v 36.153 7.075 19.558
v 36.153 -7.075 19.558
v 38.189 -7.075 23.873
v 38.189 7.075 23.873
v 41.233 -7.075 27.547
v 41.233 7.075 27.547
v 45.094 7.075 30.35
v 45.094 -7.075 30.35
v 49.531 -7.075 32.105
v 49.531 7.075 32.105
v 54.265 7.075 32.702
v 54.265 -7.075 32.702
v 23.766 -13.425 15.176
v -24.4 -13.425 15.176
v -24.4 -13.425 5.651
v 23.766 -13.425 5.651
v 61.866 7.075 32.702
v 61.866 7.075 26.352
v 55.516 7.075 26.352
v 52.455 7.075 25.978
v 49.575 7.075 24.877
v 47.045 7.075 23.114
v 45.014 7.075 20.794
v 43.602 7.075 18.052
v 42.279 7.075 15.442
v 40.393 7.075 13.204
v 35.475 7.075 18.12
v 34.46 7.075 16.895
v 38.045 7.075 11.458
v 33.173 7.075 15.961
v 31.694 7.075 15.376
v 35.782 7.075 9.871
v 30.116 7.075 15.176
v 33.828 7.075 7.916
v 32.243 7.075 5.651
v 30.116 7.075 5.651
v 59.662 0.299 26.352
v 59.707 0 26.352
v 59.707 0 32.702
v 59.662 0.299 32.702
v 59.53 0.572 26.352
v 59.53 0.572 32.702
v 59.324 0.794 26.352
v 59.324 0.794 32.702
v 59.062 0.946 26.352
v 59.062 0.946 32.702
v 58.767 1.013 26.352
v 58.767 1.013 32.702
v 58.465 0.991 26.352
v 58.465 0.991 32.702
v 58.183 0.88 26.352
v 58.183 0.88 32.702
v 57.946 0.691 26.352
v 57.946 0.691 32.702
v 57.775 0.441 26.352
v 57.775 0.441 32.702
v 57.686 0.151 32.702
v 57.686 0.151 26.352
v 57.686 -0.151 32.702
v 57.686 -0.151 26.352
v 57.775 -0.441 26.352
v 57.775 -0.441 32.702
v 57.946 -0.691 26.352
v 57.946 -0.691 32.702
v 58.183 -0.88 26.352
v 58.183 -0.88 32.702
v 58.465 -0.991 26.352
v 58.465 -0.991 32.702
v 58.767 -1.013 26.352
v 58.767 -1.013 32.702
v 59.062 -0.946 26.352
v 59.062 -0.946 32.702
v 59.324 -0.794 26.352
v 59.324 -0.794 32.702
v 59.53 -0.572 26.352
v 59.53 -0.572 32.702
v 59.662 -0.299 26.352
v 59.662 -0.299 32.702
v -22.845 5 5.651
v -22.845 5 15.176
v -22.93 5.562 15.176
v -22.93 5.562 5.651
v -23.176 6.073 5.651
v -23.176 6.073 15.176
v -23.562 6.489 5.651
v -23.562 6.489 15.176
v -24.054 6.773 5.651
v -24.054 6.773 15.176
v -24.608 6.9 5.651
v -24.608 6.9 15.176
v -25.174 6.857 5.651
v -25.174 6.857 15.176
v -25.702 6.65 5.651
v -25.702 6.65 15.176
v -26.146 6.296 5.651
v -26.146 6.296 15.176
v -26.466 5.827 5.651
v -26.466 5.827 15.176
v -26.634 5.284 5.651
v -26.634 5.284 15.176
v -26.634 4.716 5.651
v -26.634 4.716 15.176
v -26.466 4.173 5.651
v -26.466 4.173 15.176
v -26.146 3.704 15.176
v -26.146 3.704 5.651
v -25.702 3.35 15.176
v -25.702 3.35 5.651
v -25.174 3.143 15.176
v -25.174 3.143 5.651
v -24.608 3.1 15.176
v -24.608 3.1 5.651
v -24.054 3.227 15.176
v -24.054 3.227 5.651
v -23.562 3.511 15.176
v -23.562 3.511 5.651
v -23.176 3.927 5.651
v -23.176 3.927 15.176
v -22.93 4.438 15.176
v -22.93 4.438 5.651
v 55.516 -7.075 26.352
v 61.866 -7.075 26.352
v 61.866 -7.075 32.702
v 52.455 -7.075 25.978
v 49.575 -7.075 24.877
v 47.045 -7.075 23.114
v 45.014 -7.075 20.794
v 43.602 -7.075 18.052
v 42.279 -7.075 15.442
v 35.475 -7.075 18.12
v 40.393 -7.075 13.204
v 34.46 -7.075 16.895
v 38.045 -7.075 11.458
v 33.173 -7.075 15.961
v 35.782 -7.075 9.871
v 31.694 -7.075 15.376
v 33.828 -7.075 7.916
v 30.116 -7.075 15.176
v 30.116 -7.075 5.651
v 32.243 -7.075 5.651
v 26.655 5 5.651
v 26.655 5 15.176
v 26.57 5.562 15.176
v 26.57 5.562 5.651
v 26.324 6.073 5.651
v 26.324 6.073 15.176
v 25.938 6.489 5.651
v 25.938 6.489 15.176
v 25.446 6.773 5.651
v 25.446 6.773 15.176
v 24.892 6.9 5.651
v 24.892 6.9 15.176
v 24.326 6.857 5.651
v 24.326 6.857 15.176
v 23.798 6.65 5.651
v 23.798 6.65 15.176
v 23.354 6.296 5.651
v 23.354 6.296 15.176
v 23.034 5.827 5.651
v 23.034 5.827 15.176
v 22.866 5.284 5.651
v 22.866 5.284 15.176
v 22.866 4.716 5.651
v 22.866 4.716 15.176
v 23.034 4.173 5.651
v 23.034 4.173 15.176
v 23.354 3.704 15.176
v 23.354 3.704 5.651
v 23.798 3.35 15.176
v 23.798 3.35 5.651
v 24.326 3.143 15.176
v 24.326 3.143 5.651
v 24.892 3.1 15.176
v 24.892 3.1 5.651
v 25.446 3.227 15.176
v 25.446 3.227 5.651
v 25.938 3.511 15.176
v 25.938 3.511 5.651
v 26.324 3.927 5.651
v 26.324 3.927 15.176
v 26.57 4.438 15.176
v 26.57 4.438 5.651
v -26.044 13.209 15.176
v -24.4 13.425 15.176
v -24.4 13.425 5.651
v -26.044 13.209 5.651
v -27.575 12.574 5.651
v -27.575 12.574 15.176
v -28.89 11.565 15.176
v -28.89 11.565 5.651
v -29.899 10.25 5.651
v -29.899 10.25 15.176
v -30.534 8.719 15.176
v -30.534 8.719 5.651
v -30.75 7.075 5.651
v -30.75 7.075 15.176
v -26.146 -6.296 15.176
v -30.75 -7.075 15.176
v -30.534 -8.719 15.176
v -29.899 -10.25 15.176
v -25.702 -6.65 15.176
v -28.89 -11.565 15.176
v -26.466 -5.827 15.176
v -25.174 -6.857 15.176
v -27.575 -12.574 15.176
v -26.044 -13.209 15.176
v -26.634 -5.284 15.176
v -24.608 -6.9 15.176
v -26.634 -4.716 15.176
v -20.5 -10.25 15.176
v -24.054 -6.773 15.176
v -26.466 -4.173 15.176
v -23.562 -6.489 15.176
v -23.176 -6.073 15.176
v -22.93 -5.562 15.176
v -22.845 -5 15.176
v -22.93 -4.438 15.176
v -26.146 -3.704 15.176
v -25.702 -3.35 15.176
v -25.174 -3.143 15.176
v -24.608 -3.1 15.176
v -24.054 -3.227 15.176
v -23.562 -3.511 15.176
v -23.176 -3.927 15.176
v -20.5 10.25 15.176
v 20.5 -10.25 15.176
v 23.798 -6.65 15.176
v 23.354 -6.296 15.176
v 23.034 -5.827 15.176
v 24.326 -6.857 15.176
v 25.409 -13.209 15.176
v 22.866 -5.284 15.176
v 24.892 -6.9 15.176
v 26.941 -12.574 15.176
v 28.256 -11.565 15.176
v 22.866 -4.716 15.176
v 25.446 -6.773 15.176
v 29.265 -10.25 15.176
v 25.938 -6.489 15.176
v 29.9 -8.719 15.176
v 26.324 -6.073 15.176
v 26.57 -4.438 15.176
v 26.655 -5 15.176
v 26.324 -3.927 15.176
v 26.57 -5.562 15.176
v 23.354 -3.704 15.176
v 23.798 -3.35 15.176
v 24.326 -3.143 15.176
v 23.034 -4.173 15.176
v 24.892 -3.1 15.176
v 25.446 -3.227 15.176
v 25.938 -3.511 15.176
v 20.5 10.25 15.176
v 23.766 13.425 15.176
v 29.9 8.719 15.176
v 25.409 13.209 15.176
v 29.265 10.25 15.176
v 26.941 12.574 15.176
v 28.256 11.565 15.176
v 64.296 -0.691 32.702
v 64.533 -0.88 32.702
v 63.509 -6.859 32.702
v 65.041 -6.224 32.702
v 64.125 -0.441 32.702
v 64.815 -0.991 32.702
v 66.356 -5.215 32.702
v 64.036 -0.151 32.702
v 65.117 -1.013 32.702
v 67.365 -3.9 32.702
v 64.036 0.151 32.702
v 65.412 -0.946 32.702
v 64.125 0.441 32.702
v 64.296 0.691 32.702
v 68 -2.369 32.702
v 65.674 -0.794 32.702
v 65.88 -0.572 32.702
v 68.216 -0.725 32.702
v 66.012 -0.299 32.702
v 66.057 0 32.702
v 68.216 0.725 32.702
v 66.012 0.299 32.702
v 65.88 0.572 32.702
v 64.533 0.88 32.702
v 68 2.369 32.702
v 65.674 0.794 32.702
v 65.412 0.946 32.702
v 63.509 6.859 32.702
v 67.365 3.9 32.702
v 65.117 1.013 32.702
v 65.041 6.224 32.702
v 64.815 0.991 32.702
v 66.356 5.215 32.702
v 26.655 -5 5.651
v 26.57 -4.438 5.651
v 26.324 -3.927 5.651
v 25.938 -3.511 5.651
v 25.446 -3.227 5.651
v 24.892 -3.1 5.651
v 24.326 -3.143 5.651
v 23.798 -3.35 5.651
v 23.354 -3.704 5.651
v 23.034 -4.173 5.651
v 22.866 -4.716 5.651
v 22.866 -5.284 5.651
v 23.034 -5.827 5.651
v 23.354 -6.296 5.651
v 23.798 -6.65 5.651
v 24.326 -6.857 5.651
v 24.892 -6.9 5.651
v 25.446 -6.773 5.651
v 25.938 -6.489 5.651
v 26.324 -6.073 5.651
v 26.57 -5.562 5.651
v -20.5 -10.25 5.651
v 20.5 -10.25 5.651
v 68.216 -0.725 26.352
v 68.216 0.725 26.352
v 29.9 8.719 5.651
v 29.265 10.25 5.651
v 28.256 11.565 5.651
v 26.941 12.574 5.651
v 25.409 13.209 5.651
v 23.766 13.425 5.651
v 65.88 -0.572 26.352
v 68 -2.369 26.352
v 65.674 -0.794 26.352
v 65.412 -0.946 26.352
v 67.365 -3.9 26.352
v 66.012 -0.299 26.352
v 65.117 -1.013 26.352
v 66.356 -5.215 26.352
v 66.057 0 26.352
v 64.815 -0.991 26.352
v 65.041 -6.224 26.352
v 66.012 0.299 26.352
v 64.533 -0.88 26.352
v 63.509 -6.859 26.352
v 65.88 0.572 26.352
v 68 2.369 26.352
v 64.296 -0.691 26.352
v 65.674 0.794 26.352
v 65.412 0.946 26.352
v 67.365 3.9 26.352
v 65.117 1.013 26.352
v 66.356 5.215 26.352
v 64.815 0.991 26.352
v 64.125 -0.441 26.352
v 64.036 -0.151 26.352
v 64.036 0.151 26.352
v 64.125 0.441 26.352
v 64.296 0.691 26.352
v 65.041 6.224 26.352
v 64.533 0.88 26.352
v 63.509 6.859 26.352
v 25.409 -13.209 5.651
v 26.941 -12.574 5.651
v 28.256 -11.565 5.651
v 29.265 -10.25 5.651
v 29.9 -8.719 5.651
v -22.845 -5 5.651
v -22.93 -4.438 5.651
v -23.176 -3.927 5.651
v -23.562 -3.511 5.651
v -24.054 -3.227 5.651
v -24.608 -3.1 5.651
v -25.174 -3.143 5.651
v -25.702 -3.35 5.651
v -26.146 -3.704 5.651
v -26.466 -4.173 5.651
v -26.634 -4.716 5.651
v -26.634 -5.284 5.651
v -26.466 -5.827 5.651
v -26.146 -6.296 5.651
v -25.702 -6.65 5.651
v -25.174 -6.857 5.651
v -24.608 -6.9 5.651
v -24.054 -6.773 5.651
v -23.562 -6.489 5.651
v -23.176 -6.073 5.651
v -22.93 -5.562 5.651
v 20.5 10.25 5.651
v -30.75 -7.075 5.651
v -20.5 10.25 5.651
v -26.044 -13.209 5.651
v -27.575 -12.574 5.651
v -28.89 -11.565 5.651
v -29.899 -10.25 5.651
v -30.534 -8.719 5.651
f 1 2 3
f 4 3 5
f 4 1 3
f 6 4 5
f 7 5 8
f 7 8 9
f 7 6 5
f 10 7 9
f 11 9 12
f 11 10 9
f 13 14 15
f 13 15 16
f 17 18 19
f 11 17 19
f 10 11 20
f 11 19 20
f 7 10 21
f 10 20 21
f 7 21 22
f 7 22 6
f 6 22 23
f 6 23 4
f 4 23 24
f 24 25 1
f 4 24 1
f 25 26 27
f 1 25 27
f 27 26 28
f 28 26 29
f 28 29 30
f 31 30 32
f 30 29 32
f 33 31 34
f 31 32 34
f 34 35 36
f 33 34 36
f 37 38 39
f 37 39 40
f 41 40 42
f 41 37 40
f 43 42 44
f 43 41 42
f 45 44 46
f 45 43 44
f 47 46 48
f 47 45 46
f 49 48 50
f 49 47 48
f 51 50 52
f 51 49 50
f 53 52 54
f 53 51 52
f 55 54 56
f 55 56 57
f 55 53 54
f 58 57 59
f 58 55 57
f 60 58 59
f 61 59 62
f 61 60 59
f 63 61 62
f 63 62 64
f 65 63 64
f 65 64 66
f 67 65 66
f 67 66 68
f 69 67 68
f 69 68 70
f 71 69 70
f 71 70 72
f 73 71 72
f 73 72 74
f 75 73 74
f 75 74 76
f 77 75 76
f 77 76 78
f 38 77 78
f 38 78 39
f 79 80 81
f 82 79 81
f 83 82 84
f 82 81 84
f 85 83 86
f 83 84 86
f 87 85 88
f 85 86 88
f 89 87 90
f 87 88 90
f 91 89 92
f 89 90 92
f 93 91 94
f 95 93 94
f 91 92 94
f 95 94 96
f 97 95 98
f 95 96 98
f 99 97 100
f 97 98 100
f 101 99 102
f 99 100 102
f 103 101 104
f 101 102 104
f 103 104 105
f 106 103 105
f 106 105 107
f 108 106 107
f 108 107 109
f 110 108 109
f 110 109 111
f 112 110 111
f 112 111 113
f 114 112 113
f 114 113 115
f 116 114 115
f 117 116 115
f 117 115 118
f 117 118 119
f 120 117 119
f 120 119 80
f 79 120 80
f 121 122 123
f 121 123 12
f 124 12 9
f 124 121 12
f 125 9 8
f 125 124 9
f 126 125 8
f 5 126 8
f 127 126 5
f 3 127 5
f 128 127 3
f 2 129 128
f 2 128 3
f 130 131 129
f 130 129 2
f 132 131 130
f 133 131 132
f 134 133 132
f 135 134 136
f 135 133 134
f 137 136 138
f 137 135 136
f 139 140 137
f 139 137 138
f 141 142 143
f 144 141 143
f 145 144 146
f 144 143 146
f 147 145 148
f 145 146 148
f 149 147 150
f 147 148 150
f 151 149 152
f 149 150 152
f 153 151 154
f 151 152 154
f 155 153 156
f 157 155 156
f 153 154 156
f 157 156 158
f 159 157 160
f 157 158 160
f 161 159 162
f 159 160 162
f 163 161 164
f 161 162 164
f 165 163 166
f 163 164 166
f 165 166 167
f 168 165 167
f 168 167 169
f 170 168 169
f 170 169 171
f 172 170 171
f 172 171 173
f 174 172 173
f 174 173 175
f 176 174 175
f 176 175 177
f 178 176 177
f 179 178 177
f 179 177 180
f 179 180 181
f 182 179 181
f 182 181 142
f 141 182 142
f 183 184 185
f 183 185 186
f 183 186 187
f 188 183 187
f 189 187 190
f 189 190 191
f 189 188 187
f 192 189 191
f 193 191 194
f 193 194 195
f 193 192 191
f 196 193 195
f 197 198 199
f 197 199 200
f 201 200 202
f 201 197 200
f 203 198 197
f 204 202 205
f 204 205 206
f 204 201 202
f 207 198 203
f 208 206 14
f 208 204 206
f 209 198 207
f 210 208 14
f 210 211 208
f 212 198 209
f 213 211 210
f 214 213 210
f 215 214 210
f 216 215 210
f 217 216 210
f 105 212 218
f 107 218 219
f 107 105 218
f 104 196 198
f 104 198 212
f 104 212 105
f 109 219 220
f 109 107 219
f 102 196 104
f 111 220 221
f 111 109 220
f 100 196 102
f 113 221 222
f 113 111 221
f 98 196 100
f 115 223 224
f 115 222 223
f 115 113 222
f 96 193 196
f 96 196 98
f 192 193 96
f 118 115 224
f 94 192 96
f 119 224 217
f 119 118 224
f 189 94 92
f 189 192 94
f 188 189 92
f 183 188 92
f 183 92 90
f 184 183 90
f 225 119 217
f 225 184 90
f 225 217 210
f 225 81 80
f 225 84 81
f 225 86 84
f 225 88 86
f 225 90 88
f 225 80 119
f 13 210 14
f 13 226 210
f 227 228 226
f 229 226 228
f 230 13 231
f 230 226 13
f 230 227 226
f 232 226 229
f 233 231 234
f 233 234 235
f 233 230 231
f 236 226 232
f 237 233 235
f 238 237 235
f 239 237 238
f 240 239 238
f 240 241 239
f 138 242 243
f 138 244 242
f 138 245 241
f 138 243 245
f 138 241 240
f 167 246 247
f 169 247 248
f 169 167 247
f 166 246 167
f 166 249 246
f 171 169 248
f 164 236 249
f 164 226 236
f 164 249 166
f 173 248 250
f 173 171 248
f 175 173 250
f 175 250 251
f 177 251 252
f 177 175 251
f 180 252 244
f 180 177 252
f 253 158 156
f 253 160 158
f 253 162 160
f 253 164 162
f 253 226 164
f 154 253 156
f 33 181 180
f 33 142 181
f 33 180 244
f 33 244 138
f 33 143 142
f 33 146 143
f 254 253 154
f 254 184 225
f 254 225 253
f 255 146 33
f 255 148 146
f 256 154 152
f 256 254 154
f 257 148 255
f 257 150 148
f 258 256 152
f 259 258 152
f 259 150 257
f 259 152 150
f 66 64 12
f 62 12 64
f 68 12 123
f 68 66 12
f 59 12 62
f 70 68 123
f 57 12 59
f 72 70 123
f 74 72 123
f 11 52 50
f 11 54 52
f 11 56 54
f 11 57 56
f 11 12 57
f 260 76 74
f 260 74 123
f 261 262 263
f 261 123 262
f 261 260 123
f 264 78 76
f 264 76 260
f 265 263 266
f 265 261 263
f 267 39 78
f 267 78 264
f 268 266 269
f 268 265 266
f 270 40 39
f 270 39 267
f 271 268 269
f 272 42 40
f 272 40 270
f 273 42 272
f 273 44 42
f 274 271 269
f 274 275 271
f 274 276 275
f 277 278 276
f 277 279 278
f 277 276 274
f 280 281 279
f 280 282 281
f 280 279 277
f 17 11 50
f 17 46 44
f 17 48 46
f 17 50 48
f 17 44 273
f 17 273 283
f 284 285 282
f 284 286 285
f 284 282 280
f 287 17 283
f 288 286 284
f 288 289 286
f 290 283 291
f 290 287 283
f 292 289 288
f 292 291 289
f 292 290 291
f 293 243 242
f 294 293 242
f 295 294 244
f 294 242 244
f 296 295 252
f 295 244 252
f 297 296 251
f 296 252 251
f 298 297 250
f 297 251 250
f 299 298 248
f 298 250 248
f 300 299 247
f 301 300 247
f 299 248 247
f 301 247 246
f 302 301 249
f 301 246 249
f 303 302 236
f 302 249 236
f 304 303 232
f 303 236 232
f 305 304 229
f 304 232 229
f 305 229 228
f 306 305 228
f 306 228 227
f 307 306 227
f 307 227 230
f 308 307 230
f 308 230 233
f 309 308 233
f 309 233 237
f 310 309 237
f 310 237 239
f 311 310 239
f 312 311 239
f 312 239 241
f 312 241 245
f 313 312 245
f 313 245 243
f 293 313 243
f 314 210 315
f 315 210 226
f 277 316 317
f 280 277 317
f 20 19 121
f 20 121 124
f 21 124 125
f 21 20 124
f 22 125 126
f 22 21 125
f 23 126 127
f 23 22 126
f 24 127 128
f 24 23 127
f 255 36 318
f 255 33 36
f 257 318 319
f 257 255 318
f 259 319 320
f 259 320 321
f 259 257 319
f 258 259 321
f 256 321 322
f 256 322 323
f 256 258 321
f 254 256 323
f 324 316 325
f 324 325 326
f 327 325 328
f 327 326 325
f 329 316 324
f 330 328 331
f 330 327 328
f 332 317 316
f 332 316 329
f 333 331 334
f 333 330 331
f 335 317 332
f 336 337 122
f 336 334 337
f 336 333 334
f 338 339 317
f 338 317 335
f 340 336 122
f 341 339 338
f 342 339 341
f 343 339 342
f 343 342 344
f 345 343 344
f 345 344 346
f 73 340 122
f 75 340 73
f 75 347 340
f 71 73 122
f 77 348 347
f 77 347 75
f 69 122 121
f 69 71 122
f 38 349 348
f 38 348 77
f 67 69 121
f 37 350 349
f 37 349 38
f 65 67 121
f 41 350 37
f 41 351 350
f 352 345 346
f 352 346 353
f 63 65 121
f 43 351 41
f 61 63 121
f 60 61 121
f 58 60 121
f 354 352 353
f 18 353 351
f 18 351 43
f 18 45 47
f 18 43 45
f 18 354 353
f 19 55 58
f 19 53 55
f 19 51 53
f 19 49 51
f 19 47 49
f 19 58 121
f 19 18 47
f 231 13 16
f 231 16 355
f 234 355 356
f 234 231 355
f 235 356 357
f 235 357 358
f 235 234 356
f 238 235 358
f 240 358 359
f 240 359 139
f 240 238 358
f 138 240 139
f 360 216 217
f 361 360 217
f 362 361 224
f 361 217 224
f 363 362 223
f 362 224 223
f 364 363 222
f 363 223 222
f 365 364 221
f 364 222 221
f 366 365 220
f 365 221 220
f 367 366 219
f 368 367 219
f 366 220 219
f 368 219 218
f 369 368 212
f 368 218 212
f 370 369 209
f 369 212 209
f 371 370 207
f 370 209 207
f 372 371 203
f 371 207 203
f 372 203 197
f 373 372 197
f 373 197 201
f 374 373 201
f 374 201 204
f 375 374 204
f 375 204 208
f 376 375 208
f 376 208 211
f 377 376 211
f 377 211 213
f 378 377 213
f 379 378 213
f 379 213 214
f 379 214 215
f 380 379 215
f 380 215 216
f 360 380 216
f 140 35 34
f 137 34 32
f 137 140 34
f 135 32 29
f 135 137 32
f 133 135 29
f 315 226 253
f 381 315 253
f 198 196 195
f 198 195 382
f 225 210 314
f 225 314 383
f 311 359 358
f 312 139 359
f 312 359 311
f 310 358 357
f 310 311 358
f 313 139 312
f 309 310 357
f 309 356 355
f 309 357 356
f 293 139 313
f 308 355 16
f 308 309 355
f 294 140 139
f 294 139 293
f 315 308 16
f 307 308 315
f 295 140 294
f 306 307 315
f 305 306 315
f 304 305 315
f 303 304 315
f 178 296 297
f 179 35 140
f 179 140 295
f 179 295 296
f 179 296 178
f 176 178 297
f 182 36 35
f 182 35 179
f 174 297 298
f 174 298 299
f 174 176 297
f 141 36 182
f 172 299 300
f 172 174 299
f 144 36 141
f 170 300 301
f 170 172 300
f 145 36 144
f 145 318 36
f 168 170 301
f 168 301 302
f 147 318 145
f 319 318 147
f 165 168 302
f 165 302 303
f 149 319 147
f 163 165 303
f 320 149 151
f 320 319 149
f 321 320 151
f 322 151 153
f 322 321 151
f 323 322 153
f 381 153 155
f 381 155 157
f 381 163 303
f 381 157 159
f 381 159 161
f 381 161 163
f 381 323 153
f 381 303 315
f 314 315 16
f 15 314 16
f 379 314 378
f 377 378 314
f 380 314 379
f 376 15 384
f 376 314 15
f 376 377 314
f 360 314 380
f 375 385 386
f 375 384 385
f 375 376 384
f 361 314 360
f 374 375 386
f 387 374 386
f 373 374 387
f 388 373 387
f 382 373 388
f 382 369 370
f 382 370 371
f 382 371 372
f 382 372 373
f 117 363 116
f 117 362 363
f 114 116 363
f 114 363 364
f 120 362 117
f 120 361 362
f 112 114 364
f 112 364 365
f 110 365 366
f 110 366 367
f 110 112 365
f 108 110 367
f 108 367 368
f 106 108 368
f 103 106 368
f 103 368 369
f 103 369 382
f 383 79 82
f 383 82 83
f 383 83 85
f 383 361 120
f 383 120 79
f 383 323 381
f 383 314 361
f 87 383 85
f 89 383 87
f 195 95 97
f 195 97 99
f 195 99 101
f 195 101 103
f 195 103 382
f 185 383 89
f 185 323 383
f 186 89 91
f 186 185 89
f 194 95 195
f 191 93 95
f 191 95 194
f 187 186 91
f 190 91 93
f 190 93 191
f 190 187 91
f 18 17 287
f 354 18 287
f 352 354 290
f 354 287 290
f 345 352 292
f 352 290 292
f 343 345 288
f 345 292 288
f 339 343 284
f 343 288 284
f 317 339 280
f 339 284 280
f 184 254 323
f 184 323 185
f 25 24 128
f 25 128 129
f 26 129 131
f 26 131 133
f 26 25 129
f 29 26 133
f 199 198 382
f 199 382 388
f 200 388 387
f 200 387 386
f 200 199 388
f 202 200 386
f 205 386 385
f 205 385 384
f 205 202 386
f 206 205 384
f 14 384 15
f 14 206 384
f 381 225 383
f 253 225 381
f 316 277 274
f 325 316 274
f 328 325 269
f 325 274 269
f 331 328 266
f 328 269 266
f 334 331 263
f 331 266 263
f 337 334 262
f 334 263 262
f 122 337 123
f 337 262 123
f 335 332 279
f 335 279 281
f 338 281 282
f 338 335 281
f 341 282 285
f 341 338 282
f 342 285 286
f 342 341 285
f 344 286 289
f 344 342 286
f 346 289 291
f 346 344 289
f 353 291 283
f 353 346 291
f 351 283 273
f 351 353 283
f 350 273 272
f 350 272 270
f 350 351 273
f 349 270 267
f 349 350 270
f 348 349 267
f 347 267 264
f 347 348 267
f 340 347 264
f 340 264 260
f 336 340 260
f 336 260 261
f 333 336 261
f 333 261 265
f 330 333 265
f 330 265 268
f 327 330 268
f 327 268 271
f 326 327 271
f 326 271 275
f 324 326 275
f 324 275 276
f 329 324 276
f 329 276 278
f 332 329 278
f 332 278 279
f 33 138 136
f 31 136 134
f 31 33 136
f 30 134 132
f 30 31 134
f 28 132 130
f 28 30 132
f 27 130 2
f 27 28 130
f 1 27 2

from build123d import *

# Parameters (mm, degrees)
BOSS_EXTRUDE1_DEPTH      = 15.1765
SKETCH3_W                = 41
SKETCH3_H                = 20.5
CUT_EXTRUDE1_DEPTH       = 27.178
SKETCH4_R                = 1.905
CUT_EXTRUDE2_DEPTH       = 12.7
SKETCH5_W                = 6.35
SKETCH5_H                = 9.525
CUT_EXTRUDE3_DEPTH       = 10.25
BOSS_EXTRUDE2_DEPTH      = 17.526
BOSS_EXTRUDE2_DEPTH_BACK = 1.5875
SKETCH7_W                = 38.1
SKETCH7_H                = 14.15
SKETCH7_R                = 1.016
FILLET3_R                = 15.875
FILLET4_R                = 6.35
CUT_EXTRUDE4_DEPTH       = 79.37799596
SKETCH11_W               = 161.059050972
SKETCH11_H               = 91.650514338
CUT_EXTRUDE5_DEPTH       = 20.828


with BuildPart() as part:
    # Sketch2 → Boss-Extrude1 (new, symmetric)
    with BuildSketch(Plane.XY):
        with BuildLine():
            Line((23.765883374, 13.425), (-24.4, 13.425))
            ThreePointArc((-24.4, 13.425), (-28.890128061, 11.565128061), (-30.75, 7.075))
            Line((-30.75, 7.075), (-30.75, -7.075))
            ThreePointArc((-30.75, -7.075), (-28.890128061, -11.565128061), (-24.4, -13.425))
            Line((-24.4, -13.425), (23.765883374, -13.425))
            ThreePointArc((23.765883374, -13.425), (28.256011435, -11.565128061), (30.115883374, -7.075))
            Line((30.115883374, -7.075), (30.115883374, 7.075))
            ThreePointArc((30.115883374, 7.075), (28.256011435, 11.565128061), (23.765883374, 13.425))
        make_face()
    extrude(amount=BOSS_EXTRUDE1_DEPTH, both=True)

    # Sketch3 → Cut-Extrude1 (cut)
    with BuildSketch(Plane.XY.offset(15.1765)):
        Rectangle(SKETCH3_W, SKETCH3_H)
    extrude(amount=-CUT_EXTRUDE1_DEPTH, mode=Mode.SUBTRACT)

    # Sketch4 → Cut-Extrude2 (cut)
    with BuildSketch(Plane.XY.offset(15.1765)):
        with Locations((-24.75, 5)):
            Circle(SKETCH4_R)
        with Locations((-24.75, -5)):
            Circle(SKETCH4_R)
        with Locations((24.75, -5)):
            Circle(SKETCH4_R)
        with Locations((24.75, 5)):
            Circle(SKETCH4_R)
    extrude(amount=-CUT_EXTRUDE2_DEPTH, mode=Mode.SUBTRACT)

    # Sketch5 → Cut-Extrude3 (cut)
    with BuildSketch(Plane.ZY.offset(30.75)):
        with Locations((-7.1755, 0)):
            Rectangle(SKETCH5_W, SKETCH5_H)
    extrude(amount=-CUT_EXTRUDE3_DEPTH, mode=Mode.SUBTRACT)


with BuildPart() as body_2:
    # Sketch7 → Boss-Extrude2 (new, two sides: drawn at the far end of the back side and taken through both)
    with BuildSketch(Plane.XY.offset(15.1765).offset(-BOSS_EXTRUDE2_DEPTH_BACK)):
        with Locations((49.165883374, 0)):
            Rectangle(SKETCH7_W, SKETCH7_H)
        with Locations((65.040883374, 0)):
            Circle(SKETCH7_R, mode=Mode.SUBTRACT)
        with Locations((58.690883374, 0)):
            Circle(SKETCH7_R, mode=Mode.SUBTRACT)
    extrude(amount=BOSS_EXTRUDE2_DEPTH + BOSS_EXTRUDE2_DEPTH_BACK)

    # Combine1: union part
    add(part.part)

    # Fillet3
    # the kernel refuses this fillet: 15.875 mm, written as the material it adds along each edge
    with BuildSketch(Plane(origin=(30.115883374, -7.075, 13.589), x_dir=(1, 0, 0), z_dir=(0, 1, 0))) as fillet3_piece_1:
        with BuildLine():
            CenterArc((FILLET3_R, FILLET3_R), FILLET3_R, 180, 90)
            Line((0, FILLET3_R), (0, 0))
            Line((0, 0), (FILLET3_R, 0))
        make_face()
    extrude(amount=14.15)

    # Fillet4
    fillet4_edges = [body_2.edges().sort_by_distance(p)[0] for p in [
        (68.215883374, -7.075, 23.14575),
        (68.215883374, 7.075, 23.14575),
    ]]
    fillet(fillet4_edges, radius=FILLET4_R)

    # Sketch9 → Cut-Extrude4 (cut, through all)
    with BuildSketch(Plane(origin=(0, 7.075, 0), x_dir=(1, 0, 0), z_dir=(0, 1, 0))):
        with BuildLine():
            Line((54.264591911, -32.7025), (24.88975776, -36.85029523))
            Line((24.88975776, -36.85029523), (30.115883374, -15.1765))
            ThreePointArc((30.115883374, -15.1765), (33.845663864, -16.387313537), (36.153060508, -19.558))
            ThreePointArc((36.153060508, -19.558), (43.075250443, -29.070059389), (54.264591911, -32.7025))
        make_face()
        with BuildLine():
            Line((59.502916407, -4.726647085), (70.262240595, -12.045992063))
            Line((70.262240595, -12.045992063), (68.215883374, -26.3525))
            Line((68.215883374, -26.3525), (55.515883374, -26.3525))
            ThreePointArc((55.515883374, -26.3525), (48.256026462, -24.072887594), (43.6024152, -18.052417734))
            ThreePointArc((43.6024152, -18.052417734), (41.400812879, -14.268836115), (38.045363181, -11.457519704))
            Line((38.045363181, -11.457519704), (42.798116213, -7.288485815))
            Line((42.798116213, -7.288485815), (59.502916407, -4.726647085))
        make_face()
    extrude(amount=-CUT_EXTRUDE4_DEPTH, mode=Mode.SUBTRACT)

    # Sketch11 → Cut-Extrude5 (cut)
    with BuildSketch(Plane(origin=(0, 0, -15.1765), x_dir=(-1, 0, 0), z_dir=(0, 0, -1))):
        Rectangle(SKETCH11_W, SKETCH11_H)
    extrude(amount=-CUT_EXTRUDE5_DEPTH, mode=Mode.SUBTRACT)


solid = body_2.part
